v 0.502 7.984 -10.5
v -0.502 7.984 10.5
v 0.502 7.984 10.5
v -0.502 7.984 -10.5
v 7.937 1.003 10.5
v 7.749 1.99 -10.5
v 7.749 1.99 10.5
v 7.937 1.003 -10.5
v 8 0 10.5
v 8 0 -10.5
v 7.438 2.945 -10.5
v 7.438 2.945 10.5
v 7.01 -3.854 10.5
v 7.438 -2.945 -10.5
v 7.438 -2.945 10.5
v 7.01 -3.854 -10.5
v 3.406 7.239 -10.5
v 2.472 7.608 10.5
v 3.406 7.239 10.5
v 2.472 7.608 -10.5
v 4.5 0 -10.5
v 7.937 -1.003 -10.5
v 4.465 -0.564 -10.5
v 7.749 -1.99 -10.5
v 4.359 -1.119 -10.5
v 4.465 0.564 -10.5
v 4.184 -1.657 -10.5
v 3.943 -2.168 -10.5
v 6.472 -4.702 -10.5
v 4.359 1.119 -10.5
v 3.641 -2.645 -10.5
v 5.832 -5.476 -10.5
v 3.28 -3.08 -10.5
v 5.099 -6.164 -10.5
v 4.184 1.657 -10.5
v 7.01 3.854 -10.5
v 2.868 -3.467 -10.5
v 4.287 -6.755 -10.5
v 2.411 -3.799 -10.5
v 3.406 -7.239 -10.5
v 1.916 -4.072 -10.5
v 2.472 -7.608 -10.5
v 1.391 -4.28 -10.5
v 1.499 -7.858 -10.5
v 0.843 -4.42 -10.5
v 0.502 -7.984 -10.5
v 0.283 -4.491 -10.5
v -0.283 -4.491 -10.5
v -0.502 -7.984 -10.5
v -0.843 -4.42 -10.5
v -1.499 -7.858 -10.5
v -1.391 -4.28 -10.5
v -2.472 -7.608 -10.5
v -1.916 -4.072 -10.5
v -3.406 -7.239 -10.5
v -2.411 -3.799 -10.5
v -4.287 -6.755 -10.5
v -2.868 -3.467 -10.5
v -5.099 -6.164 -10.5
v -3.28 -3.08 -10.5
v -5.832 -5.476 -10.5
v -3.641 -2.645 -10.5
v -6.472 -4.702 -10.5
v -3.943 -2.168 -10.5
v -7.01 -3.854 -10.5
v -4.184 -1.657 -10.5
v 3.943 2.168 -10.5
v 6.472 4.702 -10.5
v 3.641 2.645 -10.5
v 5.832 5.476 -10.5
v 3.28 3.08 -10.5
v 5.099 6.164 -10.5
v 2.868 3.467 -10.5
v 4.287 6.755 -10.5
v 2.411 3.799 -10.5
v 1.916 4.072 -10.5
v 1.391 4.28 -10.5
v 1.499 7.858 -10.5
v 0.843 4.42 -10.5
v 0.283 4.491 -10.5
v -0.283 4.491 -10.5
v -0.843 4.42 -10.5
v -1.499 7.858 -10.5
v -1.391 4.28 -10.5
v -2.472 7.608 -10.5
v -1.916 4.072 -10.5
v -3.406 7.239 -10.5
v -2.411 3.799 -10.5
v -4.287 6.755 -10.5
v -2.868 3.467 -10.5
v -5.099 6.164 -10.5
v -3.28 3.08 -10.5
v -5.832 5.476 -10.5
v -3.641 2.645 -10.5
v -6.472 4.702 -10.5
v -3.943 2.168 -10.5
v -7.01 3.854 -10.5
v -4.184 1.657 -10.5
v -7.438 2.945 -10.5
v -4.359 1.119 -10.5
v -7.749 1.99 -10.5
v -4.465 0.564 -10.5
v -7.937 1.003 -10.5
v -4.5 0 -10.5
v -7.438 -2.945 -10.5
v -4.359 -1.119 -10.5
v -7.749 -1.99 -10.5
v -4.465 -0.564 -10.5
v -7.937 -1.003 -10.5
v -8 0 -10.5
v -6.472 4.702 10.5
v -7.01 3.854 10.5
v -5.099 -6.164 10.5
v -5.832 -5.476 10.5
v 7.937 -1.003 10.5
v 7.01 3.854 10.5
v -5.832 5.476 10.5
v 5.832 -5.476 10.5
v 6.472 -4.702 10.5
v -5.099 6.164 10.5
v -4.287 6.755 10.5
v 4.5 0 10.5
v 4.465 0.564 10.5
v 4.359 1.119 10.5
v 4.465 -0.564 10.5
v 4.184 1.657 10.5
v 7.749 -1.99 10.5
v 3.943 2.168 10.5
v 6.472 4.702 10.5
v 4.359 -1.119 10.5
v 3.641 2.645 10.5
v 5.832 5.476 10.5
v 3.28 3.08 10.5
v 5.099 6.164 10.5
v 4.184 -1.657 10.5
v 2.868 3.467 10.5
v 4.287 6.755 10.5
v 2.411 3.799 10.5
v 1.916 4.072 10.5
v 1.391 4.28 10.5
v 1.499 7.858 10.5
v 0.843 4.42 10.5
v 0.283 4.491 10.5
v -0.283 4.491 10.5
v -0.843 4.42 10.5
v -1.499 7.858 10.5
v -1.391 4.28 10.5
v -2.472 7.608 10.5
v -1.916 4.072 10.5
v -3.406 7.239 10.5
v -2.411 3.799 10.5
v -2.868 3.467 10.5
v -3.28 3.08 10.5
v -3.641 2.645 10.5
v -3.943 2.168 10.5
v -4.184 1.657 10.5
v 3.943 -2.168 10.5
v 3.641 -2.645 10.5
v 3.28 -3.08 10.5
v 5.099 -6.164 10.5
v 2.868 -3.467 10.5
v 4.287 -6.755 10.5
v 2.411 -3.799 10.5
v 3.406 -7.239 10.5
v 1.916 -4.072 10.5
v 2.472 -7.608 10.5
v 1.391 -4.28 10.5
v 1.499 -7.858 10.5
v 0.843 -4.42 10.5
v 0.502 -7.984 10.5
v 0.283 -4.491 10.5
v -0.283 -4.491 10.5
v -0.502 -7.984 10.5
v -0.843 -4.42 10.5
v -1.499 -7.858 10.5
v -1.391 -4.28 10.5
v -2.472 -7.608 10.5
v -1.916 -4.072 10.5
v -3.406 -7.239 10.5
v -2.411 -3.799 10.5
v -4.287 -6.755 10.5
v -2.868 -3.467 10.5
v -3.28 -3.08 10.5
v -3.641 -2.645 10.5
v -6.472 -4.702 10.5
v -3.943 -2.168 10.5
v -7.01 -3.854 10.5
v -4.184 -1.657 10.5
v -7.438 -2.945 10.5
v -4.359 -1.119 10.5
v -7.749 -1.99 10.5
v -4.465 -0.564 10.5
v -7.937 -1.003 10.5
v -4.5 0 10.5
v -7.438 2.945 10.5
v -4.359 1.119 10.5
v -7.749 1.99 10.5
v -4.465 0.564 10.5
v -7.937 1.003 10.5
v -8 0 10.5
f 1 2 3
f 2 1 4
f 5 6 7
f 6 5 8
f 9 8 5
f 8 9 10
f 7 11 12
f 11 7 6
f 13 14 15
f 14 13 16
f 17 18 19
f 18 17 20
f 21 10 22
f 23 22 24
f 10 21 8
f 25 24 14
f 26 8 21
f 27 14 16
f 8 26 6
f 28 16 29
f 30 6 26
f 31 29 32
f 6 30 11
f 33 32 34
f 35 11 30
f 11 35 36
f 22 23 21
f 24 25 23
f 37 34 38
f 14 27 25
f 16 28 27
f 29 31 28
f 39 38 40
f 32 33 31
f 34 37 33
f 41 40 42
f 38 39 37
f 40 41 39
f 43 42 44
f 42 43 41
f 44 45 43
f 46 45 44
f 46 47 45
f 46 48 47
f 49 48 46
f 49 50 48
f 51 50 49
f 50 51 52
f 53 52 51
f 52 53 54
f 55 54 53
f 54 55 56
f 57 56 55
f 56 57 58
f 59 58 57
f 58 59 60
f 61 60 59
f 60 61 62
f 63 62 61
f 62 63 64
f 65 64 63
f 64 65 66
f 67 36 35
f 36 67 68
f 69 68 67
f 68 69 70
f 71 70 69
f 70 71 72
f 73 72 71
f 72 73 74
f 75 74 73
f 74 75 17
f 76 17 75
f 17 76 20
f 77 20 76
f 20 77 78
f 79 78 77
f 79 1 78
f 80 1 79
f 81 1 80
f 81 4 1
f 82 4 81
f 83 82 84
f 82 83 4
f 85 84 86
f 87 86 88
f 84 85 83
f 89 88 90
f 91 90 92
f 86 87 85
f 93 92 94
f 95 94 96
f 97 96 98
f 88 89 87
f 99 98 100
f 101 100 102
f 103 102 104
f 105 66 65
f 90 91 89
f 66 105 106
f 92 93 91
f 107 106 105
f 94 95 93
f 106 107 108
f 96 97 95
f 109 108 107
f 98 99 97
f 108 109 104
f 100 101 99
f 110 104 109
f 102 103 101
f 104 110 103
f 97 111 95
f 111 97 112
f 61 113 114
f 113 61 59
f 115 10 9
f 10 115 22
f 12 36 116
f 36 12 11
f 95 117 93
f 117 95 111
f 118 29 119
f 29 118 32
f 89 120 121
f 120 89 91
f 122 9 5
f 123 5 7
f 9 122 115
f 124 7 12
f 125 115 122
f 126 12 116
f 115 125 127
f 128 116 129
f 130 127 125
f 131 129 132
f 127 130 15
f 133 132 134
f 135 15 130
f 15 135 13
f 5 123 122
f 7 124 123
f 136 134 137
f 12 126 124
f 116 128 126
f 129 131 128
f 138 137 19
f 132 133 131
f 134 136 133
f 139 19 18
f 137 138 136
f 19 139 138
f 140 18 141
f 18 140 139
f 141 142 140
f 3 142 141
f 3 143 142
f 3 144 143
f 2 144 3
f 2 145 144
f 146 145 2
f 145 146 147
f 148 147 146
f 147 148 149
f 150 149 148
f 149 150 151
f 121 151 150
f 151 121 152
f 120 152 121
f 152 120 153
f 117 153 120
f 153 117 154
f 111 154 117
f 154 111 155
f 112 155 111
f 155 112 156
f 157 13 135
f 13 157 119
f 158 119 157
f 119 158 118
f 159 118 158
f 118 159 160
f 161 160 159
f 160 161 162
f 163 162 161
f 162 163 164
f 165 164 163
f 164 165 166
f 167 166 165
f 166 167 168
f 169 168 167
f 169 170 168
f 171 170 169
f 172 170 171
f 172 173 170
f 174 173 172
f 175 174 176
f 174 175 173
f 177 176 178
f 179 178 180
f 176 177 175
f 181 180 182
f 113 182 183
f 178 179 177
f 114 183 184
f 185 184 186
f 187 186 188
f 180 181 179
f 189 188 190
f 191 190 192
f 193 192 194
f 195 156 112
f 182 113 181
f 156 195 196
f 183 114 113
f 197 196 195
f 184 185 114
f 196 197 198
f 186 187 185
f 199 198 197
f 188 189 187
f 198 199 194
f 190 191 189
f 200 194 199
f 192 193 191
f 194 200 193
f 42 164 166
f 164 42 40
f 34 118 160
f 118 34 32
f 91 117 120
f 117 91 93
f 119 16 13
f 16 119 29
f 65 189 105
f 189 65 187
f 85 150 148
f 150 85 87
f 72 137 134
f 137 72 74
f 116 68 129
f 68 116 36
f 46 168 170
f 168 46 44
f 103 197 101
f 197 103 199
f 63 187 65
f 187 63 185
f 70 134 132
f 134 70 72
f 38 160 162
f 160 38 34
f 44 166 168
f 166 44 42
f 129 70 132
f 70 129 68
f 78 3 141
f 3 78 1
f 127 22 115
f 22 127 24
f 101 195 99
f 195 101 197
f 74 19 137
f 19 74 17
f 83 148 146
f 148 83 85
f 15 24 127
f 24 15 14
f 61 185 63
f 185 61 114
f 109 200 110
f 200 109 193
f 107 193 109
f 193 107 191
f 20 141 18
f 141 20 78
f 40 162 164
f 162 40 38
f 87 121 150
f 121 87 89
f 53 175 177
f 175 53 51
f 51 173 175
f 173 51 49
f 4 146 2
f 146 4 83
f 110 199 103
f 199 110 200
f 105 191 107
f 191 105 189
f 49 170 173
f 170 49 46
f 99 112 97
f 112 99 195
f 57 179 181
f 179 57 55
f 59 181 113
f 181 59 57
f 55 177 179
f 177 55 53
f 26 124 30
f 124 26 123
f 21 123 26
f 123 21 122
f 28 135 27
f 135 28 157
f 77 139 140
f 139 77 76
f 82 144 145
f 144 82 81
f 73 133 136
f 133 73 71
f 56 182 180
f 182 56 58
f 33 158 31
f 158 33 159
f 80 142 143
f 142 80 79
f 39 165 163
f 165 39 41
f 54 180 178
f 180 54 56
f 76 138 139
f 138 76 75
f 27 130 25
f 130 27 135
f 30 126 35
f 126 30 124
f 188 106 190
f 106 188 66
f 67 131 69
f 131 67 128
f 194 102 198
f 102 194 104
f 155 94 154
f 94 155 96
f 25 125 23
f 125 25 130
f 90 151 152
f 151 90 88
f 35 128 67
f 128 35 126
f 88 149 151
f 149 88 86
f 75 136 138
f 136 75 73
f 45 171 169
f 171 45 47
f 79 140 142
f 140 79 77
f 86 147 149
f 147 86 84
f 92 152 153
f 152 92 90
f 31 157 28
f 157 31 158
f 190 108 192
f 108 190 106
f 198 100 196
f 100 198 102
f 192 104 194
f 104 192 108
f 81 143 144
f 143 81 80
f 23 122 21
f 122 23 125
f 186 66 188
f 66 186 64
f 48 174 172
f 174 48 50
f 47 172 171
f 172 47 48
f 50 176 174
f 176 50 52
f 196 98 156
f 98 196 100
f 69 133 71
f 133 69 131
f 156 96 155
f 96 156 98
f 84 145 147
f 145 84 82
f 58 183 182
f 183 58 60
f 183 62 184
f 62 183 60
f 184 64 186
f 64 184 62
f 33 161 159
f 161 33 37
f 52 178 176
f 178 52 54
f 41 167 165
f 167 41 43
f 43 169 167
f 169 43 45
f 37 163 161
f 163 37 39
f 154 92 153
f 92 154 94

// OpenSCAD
$fn = 50;


difference() {
	union() {
		translate(v = [0, 0, -10.5000000000]) {
			cylinder(h = 21, r = 8.0000000000);
		}
	}
	union() {
		translate(v = [0, 0, -100.0000000000]) {
			cylinder(h = 200, r = 4.5000000000);
		}
	}
}
